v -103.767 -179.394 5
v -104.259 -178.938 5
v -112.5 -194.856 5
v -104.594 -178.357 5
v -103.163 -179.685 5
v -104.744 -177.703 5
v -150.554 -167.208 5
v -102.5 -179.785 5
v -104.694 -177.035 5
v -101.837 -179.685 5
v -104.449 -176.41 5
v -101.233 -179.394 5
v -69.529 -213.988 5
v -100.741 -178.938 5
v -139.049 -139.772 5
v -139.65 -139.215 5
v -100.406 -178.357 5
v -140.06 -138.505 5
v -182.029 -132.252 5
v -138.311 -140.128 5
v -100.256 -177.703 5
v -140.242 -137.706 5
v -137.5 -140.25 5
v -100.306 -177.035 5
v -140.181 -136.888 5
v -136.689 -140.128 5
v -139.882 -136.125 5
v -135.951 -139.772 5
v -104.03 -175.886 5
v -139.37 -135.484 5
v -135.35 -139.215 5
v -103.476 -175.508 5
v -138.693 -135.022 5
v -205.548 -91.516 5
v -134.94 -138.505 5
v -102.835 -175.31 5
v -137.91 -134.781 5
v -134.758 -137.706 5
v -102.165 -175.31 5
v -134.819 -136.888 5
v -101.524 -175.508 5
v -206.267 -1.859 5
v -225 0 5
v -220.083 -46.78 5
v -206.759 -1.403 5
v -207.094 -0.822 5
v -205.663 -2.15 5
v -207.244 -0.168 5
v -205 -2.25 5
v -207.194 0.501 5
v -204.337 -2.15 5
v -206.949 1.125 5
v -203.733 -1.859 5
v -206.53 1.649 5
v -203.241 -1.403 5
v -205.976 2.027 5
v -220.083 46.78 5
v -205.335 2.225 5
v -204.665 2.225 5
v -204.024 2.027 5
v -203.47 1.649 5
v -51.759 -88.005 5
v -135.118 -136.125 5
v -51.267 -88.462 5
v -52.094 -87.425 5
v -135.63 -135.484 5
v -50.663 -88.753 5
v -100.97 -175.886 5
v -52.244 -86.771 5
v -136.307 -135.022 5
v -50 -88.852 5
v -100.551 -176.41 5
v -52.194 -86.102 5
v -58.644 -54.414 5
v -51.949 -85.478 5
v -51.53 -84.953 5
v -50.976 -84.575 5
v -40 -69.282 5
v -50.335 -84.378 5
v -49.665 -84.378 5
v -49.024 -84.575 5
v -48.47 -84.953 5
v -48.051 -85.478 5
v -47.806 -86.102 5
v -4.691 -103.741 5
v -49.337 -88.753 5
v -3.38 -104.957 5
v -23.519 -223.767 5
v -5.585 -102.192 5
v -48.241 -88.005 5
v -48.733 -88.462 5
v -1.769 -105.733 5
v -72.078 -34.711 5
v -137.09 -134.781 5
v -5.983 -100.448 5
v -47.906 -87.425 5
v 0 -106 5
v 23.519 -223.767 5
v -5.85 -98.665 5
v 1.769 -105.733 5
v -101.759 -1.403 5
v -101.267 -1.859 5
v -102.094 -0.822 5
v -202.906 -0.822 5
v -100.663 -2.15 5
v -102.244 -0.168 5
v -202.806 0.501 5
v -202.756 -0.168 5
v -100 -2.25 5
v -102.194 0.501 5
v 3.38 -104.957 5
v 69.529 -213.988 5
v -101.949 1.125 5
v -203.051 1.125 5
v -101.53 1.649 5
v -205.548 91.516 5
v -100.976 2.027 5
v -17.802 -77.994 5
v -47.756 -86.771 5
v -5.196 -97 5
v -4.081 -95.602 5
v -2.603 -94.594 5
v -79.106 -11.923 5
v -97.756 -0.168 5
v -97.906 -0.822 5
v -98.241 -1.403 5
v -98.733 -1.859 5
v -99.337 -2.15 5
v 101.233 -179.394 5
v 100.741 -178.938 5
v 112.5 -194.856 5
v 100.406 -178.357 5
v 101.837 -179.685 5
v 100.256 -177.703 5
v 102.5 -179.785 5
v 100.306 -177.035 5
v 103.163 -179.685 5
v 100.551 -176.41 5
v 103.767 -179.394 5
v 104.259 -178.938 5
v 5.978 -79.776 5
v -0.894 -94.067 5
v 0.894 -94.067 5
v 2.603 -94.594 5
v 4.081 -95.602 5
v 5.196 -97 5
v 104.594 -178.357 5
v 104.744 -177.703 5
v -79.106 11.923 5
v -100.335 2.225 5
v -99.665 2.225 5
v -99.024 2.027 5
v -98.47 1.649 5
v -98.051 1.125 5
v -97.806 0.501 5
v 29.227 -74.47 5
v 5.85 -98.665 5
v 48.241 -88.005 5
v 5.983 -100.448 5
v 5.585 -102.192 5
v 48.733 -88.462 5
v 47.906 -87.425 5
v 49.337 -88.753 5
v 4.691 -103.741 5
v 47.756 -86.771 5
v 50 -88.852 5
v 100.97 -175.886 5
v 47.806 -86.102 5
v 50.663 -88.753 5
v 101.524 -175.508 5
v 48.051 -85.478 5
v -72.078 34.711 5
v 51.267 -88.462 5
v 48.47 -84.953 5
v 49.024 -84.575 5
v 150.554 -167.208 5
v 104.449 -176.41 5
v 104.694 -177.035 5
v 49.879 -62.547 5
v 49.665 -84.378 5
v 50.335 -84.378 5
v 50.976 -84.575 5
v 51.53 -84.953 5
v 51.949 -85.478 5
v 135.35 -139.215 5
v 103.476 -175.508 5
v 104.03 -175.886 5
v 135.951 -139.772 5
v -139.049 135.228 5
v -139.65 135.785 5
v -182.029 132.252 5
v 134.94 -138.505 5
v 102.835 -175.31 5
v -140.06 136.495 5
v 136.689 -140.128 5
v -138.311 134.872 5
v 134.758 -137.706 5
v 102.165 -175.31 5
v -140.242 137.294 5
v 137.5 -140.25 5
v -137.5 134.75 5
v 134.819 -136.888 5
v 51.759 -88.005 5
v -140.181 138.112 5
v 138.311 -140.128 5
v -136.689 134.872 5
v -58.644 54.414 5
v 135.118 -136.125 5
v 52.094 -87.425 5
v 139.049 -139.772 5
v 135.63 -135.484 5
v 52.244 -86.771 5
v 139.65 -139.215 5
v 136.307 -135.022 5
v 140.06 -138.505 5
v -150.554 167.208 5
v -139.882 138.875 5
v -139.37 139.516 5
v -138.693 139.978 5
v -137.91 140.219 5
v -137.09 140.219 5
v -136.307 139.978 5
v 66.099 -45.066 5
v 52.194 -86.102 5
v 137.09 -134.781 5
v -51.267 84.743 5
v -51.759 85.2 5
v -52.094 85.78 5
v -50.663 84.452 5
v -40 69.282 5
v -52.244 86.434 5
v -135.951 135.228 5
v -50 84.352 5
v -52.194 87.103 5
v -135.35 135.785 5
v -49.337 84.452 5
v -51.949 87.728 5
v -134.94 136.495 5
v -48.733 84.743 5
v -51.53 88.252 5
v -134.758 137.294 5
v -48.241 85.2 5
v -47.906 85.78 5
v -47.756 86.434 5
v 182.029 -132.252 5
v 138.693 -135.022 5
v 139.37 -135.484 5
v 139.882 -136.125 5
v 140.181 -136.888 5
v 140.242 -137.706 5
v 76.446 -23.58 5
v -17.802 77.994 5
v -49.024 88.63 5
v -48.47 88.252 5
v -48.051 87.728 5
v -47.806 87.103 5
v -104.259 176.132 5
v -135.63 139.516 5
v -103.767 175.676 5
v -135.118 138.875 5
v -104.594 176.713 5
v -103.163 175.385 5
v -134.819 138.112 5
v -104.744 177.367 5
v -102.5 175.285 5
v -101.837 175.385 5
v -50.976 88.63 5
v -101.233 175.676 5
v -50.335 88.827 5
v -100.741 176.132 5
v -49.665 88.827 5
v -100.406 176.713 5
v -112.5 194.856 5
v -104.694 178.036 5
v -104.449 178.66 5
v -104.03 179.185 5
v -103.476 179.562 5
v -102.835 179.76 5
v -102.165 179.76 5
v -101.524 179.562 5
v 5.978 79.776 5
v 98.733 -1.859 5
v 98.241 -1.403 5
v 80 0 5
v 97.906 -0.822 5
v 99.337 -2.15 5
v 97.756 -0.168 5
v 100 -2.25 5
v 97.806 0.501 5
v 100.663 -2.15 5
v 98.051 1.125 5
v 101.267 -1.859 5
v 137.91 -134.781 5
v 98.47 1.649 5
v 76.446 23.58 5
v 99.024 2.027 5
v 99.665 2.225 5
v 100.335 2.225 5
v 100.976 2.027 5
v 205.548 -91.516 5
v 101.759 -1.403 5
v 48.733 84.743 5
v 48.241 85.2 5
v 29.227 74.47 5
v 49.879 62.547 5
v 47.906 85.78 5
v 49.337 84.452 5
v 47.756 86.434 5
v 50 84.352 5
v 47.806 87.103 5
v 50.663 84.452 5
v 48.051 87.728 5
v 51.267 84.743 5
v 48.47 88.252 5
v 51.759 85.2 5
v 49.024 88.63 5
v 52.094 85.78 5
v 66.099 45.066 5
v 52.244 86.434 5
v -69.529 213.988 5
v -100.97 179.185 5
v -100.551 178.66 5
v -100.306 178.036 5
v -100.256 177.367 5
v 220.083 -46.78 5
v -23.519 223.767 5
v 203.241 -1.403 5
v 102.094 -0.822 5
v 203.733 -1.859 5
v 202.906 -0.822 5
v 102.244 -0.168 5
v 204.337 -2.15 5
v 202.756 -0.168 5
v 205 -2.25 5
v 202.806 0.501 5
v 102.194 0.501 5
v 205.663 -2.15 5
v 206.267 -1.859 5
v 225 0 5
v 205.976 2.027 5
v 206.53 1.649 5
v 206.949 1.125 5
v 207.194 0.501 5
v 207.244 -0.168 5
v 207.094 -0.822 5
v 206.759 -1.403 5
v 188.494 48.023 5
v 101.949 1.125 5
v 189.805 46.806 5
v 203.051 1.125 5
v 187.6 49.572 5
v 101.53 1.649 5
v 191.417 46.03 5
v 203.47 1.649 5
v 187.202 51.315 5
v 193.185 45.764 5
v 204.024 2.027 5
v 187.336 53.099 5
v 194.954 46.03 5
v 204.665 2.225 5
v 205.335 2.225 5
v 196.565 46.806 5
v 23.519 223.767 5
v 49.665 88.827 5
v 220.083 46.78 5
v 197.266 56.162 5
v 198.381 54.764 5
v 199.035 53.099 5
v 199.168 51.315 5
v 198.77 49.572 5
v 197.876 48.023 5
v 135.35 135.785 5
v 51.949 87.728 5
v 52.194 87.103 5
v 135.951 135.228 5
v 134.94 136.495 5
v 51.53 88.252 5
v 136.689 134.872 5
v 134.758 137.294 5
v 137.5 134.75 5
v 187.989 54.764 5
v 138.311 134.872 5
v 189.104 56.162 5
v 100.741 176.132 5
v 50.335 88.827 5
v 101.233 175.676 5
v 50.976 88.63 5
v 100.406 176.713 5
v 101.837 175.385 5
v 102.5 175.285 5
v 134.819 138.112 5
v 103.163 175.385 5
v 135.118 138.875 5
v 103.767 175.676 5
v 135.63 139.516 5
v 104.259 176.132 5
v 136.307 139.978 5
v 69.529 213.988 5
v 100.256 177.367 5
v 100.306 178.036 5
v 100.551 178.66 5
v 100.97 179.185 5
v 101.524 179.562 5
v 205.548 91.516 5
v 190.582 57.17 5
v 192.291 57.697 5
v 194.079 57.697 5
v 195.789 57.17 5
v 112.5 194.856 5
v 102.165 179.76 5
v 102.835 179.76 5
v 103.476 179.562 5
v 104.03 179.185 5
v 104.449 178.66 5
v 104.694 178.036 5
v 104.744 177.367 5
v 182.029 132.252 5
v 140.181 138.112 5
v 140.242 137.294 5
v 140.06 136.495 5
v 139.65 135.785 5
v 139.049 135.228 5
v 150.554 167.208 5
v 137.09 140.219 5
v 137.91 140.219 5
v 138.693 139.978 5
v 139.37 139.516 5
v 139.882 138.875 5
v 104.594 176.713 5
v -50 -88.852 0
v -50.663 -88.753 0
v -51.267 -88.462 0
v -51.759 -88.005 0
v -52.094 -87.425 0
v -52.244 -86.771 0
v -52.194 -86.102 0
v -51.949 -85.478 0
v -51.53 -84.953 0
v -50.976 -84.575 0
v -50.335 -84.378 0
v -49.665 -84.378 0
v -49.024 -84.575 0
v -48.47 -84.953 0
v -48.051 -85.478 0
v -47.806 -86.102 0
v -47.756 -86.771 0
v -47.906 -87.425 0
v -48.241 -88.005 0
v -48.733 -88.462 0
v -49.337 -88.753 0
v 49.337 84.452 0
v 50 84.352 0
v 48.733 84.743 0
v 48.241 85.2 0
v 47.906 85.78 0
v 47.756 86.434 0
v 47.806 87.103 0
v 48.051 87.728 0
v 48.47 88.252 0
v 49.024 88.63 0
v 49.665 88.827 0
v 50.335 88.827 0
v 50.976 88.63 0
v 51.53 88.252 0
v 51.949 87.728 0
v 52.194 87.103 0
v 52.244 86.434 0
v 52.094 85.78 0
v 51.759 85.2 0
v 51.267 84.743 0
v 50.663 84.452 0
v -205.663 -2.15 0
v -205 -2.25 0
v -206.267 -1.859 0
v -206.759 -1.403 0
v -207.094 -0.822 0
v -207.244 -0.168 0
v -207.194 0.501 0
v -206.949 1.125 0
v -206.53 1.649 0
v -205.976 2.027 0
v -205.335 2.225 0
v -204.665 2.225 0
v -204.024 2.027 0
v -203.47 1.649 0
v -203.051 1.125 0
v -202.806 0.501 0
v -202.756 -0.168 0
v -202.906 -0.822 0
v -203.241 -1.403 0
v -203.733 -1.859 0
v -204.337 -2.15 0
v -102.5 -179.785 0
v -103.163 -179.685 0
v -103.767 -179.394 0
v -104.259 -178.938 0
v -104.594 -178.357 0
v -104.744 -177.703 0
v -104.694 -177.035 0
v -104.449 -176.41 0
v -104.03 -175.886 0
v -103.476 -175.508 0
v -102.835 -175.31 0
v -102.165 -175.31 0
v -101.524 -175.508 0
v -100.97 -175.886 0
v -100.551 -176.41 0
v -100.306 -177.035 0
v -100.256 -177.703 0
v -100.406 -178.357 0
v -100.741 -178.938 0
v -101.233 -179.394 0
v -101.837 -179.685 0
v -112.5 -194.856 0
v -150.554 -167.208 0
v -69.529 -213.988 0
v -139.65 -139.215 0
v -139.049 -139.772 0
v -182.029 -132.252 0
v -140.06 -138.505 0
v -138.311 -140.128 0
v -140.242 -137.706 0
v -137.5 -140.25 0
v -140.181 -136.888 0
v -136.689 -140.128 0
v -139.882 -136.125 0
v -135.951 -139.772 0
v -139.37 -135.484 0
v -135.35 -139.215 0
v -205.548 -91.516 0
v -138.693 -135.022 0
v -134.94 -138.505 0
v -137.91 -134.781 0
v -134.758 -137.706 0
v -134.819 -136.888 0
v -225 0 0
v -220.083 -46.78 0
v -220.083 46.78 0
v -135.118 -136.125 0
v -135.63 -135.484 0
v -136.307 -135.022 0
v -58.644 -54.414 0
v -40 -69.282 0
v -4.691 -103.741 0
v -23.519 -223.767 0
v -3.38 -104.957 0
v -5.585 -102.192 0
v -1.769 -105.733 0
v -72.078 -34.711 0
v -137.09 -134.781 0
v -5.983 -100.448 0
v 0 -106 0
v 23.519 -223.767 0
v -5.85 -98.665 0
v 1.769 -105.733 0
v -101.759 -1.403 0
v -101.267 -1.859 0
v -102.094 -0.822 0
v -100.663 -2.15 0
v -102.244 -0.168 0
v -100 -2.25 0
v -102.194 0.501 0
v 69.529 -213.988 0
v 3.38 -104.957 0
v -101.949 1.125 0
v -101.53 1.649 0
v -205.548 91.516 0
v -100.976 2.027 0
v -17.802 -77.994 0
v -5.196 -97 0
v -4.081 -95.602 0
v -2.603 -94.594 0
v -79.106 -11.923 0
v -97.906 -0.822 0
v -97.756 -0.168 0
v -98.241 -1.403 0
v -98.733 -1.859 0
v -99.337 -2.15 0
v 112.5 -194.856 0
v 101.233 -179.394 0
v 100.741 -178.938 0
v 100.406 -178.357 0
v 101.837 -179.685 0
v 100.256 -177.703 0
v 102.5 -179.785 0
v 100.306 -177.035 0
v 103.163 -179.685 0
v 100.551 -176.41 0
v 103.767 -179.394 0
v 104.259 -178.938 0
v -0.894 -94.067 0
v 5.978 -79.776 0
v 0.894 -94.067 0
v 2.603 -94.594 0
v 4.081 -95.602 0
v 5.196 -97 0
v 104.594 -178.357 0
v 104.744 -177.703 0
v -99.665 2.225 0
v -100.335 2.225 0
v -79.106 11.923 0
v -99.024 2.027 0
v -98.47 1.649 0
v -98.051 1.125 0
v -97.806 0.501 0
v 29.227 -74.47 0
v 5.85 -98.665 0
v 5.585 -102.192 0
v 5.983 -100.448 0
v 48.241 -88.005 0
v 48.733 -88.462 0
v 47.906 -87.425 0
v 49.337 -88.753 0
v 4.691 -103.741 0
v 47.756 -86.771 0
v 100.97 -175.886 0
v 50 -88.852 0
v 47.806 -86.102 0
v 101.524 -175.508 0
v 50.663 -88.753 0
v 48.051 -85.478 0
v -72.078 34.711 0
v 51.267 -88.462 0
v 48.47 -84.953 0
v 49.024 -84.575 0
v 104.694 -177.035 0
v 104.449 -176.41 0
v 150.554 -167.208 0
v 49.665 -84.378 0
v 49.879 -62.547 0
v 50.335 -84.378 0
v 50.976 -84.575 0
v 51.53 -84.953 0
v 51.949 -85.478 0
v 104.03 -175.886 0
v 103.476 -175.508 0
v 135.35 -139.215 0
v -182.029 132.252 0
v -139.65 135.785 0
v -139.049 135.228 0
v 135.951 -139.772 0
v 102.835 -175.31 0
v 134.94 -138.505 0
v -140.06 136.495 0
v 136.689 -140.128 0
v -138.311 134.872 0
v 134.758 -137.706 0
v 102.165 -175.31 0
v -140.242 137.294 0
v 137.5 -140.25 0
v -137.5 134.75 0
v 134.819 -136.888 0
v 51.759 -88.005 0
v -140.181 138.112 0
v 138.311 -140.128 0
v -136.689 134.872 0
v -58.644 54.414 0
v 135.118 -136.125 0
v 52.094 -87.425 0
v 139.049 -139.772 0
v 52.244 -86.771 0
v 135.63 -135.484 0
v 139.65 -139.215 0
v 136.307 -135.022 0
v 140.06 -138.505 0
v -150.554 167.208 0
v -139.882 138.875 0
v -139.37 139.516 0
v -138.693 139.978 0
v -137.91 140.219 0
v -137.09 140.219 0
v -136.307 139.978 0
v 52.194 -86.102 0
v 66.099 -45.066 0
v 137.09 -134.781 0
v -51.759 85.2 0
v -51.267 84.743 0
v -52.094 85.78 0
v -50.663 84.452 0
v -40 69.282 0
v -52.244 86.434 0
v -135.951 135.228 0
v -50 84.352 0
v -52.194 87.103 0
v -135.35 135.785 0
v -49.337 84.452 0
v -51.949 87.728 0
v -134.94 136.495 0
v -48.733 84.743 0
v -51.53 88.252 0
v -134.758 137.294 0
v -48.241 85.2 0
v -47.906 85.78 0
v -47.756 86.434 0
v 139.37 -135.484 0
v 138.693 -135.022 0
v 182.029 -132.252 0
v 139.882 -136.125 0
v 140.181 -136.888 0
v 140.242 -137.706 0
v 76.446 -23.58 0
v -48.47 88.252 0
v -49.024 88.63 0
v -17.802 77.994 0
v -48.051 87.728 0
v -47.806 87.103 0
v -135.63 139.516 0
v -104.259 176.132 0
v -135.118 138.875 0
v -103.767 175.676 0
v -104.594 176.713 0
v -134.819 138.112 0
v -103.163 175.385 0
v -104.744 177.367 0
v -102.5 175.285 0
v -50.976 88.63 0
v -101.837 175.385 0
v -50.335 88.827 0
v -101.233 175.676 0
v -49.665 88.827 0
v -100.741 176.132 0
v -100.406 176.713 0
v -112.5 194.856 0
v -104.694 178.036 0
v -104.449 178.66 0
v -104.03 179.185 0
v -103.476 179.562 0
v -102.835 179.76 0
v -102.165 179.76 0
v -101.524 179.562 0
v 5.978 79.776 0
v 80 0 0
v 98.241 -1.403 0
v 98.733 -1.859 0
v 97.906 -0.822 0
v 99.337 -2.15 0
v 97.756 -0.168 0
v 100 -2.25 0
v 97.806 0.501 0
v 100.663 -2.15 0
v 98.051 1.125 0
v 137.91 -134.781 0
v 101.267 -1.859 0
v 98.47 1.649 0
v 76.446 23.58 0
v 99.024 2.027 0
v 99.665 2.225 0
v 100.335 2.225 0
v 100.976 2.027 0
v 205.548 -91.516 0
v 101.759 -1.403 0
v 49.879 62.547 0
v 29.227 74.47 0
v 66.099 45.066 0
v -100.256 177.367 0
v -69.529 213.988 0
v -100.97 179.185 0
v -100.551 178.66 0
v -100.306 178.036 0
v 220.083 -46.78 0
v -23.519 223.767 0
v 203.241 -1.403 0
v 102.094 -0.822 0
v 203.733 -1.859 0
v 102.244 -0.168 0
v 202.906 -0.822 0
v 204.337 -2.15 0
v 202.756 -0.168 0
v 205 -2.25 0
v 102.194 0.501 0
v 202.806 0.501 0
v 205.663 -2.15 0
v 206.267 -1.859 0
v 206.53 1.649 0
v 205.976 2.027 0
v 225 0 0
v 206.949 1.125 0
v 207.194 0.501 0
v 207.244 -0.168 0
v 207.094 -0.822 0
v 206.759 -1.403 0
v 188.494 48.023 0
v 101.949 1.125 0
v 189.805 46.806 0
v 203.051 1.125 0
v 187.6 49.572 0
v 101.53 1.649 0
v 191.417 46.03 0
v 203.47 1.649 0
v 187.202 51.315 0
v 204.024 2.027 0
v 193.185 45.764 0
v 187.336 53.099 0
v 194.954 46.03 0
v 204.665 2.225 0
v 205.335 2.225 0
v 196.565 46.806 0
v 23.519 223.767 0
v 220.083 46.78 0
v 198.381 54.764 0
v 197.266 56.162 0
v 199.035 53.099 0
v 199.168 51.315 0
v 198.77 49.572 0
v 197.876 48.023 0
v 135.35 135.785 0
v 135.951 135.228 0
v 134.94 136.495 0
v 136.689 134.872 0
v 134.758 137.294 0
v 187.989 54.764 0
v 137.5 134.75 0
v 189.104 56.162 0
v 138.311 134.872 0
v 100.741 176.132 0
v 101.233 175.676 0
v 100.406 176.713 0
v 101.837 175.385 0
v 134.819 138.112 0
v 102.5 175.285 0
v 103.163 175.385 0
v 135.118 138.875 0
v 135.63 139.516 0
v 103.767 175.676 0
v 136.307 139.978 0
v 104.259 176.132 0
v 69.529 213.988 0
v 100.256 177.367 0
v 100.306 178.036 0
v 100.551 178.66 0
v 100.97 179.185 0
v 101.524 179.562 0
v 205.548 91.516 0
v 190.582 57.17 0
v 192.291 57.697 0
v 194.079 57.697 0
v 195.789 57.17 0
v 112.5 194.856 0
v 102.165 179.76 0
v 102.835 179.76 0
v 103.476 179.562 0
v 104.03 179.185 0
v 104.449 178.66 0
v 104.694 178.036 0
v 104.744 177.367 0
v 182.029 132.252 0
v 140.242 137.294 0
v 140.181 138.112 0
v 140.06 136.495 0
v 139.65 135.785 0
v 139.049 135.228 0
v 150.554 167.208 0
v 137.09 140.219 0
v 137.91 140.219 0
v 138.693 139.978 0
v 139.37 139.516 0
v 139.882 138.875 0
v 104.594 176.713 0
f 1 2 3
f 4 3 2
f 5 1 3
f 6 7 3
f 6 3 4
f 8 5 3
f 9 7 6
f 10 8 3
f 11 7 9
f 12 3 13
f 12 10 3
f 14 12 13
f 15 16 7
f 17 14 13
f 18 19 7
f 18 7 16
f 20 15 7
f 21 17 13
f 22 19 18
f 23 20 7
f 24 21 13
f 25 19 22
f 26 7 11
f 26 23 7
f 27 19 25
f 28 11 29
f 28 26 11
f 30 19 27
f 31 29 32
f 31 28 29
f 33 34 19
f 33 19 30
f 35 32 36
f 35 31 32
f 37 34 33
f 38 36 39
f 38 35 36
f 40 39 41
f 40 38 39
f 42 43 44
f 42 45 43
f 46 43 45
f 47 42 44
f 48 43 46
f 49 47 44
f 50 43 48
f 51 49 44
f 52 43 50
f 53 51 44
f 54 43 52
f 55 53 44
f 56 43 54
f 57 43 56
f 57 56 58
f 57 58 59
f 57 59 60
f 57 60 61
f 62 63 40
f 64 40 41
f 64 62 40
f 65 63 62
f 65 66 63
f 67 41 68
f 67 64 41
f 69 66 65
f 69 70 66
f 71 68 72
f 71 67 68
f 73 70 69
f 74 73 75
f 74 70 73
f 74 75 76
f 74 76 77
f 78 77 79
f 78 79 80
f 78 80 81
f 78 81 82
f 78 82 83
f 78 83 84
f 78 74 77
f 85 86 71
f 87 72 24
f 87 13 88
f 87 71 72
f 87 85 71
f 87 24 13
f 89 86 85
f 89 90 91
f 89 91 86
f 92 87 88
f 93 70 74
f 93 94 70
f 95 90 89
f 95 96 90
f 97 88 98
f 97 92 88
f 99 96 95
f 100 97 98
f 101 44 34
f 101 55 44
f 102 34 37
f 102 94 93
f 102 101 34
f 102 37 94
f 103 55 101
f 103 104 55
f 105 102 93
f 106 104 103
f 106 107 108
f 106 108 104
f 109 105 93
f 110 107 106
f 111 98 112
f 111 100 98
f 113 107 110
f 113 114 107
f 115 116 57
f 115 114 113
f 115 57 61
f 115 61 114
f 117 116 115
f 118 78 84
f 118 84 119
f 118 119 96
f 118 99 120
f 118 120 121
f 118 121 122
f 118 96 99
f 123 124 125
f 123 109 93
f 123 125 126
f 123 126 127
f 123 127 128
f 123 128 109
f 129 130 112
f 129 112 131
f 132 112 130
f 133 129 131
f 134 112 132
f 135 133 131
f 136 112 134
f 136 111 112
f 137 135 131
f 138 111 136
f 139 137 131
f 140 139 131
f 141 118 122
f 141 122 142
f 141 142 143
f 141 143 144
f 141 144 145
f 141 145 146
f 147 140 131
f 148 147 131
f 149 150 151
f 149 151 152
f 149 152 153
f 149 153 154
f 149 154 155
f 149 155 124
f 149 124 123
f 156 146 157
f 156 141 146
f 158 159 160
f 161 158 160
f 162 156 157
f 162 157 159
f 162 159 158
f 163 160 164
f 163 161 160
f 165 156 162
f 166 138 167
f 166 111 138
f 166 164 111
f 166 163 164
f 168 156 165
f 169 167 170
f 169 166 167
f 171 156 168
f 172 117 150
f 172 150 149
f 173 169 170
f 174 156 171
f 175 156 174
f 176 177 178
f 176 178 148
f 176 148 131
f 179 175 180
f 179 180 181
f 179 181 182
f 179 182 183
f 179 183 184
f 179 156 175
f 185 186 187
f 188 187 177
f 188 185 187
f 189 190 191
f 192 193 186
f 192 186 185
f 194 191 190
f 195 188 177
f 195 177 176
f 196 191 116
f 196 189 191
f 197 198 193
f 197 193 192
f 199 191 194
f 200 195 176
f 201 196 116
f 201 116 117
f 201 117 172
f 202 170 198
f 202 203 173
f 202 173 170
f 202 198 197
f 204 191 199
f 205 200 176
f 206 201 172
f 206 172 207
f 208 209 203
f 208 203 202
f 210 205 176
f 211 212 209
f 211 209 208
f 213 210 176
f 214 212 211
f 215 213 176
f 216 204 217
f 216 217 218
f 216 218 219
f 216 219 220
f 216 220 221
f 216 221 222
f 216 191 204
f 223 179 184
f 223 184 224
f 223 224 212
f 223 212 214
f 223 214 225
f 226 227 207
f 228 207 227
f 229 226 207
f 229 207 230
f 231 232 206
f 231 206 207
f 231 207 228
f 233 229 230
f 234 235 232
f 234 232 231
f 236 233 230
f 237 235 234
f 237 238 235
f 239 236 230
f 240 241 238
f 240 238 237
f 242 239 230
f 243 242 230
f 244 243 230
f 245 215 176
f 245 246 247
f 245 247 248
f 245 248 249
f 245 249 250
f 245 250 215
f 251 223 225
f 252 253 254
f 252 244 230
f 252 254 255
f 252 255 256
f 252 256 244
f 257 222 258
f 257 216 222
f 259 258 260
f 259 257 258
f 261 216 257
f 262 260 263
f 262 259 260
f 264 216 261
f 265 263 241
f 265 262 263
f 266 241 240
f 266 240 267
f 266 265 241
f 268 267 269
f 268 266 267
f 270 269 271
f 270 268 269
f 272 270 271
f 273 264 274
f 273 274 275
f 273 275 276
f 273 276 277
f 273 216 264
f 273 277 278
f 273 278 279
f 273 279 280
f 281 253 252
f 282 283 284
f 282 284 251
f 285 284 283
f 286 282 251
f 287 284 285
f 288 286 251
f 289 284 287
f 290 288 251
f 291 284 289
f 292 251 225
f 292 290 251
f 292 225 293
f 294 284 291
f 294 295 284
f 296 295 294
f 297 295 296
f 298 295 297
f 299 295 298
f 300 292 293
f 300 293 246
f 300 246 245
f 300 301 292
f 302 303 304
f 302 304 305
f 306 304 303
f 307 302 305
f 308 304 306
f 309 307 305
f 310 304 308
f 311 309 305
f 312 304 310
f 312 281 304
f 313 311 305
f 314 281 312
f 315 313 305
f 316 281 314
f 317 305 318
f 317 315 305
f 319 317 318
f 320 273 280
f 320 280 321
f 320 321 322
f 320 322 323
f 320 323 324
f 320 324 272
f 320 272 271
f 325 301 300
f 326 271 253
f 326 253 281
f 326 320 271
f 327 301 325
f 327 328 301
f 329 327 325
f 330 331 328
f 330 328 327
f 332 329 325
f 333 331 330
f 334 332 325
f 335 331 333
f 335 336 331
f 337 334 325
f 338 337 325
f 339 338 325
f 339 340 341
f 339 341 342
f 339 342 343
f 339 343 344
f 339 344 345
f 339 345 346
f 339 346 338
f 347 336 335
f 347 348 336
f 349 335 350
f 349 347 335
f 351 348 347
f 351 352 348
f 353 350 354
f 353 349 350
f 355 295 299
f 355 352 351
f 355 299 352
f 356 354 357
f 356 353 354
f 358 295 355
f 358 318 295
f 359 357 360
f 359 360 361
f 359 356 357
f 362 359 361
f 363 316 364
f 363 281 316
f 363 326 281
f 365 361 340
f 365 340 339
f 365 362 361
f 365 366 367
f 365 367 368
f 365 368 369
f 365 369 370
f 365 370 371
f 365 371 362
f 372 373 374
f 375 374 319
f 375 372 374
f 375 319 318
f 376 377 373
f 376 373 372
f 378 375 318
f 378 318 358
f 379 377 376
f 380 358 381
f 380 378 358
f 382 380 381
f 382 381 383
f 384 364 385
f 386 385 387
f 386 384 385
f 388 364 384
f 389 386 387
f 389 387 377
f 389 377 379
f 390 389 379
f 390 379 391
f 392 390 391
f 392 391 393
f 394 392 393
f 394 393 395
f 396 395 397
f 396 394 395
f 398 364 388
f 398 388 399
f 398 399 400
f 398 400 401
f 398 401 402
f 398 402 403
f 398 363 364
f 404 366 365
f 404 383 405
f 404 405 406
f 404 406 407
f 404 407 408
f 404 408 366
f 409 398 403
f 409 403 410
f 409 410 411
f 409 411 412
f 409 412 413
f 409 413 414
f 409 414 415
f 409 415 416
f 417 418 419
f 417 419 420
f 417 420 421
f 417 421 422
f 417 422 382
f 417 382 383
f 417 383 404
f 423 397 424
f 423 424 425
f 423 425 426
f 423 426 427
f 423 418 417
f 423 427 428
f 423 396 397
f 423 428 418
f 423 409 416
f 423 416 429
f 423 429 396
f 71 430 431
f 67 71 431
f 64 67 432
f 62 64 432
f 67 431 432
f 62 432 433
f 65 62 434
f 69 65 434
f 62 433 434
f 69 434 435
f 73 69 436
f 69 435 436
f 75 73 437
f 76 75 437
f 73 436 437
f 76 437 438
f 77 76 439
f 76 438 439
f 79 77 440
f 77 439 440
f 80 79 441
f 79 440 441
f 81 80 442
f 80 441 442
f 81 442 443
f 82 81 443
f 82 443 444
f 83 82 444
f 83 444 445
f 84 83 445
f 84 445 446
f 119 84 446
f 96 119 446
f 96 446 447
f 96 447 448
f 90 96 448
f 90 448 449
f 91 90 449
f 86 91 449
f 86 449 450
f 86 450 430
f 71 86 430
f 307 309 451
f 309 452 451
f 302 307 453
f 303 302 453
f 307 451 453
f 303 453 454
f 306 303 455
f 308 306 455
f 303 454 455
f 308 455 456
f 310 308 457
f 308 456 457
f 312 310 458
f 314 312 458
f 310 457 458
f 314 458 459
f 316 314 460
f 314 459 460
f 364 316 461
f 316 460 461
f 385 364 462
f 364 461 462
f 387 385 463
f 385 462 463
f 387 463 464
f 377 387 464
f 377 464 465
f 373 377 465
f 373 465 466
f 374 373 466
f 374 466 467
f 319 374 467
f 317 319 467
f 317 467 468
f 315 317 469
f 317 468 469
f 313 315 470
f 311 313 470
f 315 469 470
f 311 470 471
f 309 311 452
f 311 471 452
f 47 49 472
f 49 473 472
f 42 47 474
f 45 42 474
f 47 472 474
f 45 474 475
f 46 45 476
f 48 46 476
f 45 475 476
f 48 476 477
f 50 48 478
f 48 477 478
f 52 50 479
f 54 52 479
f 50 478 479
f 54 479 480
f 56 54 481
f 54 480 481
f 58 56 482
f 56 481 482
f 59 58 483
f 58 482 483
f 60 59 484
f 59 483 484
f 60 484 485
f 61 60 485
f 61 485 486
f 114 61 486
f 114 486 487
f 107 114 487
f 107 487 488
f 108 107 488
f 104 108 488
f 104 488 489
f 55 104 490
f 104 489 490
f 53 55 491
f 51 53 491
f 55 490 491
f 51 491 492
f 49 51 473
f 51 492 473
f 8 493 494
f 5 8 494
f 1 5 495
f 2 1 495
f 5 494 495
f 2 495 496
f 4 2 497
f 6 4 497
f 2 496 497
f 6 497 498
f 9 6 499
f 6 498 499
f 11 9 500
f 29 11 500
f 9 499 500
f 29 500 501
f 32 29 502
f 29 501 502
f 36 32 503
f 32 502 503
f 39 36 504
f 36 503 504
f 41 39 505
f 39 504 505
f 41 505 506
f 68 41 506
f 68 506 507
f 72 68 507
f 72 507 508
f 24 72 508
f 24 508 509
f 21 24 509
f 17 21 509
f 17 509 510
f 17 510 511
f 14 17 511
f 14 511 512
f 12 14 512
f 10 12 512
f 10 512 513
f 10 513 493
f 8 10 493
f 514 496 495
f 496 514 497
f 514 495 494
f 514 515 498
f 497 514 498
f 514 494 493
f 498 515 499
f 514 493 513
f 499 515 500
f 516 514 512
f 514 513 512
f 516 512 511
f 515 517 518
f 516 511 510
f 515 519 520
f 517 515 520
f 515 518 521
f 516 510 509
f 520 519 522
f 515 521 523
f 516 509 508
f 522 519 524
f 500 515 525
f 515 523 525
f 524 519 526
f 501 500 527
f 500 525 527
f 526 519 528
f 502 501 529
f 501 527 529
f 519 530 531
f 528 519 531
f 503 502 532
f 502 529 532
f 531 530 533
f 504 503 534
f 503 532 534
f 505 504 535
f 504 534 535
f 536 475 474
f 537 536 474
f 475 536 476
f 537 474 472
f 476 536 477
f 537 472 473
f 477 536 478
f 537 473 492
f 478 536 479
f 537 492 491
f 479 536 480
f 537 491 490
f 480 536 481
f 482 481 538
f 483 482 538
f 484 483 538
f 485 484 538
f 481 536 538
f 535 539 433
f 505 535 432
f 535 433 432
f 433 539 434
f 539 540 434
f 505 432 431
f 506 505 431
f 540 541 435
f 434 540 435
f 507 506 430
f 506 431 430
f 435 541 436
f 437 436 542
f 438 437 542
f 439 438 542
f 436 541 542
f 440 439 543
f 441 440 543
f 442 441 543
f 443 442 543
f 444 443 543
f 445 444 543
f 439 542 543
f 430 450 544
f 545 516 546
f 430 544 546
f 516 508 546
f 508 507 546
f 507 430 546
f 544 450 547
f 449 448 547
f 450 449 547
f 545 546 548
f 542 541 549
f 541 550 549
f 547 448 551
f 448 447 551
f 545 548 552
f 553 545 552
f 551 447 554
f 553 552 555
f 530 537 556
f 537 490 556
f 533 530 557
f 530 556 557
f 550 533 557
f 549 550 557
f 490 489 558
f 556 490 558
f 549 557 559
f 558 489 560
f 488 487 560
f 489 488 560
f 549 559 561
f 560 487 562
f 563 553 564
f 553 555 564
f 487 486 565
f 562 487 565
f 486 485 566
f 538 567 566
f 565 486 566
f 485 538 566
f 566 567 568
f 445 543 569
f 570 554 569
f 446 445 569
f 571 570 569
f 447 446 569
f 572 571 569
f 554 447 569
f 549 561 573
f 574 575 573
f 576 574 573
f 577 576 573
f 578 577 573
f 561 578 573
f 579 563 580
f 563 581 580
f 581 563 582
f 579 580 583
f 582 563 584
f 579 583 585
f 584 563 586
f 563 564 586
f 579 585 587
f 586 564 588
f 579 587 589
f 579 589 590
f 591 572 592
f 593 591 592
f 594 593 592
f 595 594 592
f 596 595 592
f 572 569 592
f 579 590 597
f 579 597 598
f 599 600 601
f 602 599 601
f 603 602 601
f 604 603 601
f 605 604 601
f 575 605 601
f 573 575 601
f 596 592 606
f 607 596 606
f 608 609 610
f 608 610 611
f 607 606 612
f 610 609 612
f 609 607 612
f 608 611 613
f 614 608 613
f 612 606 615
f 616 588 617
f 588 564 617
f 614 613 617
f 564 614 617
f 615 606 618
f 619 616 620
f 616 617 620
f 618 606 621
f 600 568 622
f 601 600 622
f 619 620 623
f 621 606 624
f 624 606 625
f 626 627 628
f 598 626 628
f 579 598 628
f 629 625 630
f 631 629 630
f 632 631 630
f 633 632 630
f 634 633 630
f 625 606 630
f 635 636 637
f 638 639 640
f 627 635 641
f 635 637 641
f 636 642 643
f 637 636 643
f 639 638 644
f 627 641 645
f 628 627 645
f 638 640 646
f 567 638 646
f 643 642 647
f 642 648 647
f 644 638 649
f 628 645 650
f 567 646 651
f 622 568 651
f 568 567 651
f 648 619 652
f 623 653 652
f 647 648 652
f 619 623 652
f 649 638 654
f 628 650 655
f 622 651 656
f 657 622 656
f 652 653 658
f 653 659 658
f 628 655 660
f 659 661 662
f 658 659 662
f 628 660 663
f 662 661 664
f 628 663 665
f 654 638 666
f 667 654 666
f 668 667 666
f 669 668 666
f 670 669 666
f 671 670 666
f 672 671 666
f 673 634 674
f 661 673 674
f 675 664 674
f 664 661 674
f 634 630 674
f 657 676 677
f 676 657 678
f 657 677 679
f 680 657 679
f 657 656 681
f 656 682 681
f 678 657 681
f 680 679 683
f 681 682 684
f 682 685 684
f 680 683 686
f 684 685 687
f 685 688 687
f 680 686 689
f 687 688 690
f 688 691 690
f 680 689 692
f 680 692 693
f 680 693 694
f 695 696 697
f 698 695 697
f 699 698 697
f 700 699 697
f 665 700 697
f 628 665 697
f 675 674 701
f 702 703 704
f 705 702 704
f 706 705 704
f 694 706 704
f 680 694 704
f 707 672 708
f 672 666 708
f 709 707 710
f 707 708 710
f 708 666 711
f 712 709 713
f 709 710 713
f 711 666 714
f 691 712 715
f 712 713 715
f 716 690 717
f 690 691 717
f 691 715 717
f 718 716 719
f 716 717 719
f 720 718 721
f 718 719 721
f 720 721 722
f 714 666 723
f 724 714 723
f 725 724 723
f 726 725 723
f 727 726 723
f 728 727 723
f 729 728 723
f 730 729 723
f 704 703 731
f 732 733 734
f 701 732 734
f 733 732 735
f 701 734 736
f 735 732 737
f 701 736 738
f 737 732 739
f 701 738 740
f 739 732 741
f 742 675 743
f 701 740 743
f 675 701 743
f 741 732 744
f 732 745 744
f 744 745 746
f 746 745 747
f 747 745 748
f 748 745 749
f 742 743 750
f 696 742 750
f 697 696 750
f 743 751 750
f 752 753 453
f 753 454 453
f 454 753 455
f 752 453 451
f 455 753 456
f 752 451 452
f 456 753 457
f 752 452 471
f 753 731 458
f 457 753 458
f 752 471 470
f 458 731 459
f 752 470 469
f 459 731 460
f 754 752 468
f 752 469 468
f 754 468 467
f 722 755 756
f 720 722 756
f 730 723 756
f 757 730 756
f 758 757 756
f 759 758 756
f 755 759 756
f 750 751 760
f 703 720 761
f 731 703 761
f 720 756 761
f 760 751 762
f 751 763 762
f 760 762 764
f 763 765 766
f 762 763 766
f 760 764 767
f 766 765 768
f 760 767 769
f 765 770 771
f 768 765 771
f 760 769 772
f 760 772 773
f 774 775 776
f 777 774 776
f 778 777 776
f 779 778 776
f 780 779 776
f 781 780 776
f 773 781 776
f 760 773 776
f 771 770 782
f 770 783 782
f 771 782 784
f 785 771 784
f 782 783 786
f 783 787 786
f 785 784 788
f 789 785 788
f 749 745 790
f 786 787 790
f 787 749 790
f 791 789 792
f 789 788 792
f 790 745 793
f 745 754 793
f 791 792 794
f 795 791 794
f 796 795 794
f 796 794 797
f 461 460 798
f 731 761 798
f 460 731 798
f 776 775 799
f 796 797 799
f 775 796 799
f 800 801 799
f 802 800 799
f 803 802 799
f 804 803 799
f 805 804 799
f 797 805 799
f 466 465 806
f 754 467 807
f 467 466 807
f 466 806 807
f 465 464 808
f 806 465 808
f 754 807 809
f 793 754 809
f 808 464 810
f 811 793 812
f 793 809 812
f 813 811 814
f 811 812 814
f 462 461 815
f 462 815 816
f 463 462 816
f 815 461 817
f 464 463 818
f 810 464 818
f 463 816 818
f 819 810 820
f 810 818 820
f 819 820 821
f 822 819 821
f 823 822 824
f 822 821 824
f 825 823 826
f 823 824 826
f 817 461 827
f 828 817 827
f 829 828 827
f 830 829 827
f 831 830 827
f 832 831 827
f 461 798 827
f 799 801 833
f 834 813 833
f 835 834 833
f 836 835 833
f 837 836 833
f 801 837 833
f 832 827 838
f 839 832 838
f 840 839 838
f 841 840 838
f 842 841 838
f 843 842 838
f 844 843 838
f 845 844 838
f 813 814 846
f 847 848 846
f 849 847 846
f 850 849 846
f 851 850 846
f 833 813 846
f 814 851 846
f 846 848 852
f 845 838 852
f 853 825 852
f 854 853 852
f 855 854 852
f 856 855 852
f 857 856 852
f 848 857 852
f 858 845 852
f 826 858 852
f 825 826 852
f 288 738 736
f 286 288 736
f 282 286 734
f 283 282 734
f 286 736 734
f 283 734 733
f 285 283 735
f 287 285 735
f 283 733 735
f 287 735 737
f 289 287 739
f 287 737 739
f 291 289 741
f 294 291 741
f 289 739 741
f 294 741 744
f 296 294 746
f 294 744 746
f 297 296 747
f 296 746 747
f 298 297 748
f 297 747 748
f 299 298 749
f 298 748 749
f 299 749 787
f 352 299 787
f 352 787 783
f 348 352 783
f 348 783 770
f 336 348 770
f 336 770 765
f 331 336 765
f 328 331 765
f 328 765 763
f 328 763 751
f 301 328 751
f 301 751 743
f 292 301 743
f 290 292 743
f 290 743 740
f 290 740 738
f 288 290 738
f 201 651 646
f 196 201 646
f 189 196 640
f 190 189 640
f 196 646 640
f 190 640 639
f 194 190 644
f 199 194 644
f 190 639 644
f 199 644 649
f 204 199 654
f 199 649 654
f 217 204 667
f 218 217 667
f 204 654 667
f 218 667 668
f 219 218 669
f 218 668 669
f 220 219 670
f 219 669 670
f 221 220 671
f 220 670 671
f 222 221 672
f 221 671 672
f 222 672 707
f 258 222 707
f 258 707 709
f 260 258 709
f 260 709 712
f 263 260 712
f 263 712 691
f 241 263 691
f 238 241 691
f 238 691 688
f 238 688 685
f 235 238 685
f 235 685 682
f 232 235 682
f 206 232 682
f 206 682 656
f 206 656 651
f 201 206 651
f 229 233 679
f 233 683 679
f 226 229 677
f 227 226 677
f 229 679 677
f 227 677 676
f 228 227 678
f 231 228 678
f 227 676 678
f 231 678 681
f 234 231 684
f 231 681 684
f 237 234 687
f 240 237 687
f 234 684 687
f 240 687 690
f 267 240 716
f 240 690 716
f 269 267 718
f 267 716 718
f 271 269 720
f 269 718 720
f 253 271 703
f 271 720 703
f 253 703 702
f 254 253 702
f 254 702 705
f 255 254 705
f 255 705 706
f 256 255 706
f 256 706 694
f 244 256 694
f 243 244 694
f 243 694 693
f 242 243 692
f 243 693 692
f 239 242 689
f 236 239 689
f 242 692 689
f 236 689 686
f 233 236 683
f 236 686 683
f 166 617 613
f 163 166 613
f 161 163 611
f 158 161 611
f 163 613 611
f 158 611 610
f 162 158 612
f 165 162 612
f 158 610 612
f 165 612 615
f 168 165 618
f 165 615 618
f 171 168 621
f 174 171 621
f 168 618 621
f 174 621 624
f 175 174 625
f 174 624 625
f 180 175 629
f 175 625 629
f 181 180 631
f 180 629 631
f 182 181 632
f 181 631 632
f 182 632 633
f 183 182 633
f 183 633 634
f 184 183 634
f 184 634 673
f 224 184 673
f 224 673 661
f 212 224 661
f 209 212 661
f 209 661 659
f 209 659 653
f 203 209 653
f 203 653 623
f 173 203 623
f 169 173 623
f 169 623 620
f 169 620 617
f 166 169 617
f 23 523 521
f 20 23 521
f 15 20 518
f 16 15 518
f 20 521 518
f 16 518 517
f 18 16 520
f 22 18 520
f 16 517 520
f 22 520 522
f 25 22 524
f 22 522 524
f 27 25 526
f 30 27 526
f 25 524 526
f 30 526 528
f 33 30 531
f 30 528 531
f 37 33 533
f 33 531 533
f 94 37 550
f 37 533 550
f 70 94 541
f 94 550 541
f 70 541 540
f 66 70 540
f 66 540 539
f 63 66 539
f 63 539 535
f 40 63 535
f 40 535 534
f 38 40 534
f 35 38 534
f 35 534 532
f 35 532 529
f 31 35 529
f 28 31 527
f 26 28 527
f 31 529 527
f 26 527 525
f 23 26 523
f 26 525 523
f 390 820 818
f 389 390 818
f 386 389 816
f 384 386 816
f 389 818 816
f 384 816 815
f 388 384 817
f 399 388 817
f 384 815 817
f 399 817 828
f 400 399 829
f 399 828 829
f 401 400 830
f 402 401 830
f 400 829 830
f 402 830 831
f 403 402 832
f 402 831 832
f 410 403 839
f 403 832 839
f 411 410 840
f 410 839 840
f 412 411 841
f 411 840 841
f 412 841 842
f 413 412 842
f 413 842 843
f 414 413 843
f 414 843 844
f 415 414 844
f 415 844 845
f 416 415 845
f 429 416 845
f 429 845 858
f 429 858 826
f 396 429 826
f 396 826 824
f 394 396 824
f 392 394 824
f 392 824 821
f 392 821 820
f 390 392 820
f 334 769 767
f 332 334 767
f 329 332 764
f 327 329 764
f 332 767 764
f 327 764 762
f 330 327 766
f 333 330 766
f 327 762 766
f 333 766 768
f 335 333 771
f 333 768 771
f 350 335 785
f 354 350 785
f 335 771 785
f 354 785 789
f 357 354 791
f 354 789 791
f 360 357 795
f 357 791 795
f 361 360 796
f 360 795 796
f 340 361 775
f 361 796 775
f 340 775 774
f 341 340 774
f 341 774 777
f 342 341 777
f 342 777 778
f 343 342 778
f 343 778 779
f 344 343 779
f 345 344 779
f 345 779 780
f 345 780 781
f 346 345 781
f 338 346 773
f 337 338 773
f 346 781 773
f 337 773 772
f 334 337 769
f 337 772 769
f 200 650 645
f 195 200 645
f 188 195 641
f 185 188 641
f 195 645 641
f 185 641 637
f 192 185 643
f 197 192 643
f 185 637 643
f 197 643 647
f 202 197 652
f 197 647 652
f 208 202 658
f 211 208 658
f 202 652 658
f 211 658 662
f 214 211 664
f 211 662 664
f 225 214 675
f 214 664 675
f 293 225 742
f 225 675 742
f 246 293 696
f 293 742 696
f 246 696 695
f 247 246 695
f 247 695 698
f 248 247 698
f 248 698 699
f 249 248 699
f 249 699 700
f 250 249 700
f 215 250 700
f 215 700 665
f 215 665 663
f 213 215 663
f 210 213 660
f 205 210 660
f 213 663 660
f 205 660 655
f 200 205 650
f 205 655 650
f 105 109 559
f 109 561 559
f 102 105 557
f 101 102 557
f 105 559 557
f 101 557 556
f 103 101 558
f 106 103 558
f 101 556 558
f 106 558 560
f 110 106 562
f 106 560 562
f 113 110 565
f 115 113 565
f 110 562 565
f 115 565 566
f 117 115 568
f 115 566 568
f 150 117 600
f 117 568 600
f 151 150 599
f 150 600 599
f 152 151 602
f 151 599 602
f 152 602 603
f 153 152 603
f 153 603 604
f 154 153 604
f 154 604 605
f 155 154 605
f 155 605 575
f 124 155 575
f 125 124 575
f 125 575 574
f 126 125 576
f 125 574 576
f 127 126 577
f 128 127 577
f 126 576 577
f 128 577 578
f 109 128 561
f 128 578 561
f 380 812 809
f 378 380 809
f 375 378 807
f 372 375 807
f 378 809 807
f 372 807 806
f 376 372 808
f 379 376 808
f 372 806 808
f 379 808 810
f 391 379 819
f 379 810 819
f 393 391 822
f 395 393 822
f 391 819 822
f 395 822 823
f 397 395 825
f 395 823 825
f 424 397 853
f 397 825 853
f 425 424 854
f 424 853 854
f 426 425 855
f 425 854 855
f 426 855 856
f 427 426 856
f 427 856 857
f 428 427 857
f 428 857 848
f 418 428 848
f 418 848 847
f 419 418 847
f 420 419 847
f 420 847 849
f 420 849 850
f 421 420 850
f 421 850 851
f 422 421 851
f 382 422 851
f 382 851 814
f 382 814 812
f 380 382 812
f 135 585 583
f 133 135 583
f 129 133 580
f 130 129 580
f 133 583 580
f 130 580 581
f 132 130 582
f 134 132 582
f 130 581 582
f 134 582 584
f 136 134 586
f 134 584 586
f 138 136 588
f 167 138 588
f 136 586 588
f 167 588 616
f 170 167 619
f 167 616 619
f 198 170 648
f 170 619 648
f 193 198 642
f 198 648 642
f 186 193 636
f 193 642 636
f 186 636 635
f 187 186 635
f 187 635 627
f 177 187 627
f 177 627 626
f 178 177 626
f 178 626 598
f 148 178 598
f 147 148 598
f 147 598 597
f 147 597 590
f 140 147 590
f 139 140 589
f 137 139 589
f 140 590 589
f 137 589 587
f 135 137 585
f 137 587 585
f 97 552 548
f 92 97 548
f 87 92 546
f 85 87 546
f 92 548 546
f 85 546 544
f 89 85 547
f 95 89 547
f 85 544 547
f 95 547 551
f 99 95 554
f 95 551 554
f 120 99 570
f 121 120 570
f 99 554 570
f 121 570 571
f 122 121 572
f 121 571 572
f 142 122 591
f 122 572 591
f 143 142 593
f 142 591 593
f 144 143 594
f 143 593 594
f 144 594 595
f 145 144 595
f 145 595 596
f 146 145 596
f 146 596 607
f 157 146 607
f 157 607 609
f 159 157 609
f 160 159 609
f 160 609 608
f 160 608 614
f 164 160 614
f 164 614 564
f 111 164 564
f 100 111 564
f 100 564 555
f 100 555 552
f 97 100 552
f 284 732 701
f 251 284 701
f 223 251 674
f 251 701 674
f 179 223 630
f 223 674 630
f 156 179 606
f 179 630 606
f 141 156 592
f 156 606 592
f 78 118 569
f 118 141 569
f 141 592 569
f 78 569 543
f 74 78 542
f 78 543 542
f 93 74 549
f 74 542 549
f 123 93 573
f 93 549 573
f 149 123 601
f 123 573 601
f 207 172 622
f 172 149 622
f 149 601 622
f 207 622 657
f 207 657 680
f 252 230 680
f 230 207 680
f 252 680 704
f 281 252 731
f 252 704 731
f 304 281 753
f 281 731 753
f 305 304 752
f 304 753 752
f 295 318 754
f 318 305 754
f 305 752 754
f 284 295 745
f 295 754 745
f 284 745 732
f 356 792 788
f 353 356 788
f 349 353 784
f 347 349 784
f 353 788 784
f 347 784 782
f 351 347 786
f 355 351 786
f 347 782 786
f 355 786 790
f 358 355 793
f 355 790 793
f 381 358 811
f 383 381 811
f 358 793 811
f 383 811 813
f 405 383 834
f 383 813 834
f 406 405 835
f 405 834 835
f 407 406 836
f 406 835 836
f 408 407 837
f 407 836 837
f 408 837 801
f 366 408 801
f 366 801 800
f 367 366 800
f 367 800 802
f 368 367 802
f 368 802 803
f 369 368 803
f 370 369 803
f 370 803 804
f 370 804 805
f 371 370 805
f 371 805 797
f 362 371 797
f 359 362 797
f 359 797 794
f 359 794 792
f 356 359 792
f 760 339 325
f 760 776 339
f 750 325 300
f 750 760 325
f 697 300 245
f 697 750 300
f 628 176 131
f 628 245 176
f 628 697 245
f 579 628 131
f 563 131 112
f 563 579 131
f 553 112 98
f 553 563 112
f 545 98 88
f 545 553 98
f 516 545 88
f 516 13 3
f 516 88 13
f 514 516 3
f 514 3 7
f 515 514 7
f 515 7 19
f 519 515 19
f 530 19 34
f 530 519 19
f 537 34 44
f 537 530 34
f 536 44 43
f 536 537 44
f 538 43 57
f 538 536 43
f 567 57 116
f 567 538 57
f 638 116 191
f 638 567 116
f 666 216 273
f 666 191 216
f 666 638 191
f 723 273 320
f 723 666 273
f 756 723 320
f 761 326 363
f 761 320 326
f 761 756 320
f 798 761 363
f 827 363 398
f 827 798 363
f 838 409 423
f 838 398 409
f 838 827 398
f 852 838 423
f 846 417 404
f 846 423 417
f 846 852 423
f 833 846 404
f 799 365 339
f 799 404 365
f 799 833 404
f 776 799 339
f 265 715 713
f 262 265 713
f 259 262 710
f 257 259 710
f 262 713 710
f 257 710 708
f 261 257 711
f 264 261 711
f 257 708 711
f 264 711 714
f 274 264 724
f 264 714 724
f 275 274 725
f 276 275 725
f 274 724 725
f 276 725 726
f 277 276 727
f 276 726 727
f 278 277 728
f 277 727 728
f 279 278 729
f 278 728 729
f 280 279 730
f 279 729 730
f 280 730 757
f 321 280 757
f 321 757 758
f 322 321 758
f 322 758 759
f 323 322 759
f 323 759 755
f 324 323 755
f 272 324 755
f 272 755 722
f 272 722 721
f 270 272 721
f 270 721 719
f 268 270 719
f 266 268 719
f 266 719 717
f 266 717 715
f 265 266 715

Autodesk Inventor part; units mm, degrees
ref_plane "YZ Plane" through (0, 0, 0) normal (1, 0, 0) x (0, 1, 0)
ref_plane "XZ Plane" through (0, 0, 0) normal (0, 1, 0) x (-1, 0, 0)
ref_plane "XY Plane" through (0, 0, 0) normal (0, 0, 1) x (1, 0, 0)
sketch "Sketch1" plane through (0, 0, 0) normal (0, 0, 1) x (1, 0, 0)
  circle A0 centre (0, 0) radius 80
  circle A1 centre (0, 0) radius 225
  dimension "d0" = 160
  dimension "d1" = 450
extrude "Extrusion1" add sketch "Sketch1" along normal blind 5
sketch "Sketch2" plane through (0, 0, 5) normal (0, 0, 1) x (1, 0, 0)
  line L0 (-205, 0) -> (-100, 0) construction
  point P0 (0, 0)
  point P1 (-102.5, -177.5352)
  point P2 (-50, -86.6025)
  point P3 (102.5, -177.5352)
  point P4 (50, -86.6025)
  point P5 (205, 0)
  point P6 (100, 0)
  point P7 (102.5, 177.5352)
  point P8 (50, 86.6025)
  point P9 (-102.5, 177.5352)
  point P10 (-50, 86.6025)
  dimension "d4" = 100
  dimension "d5" = 205
  dimension "d8" = 360
hole "Hole1" at (-205, 0, 5) at (-100, 0, 5) at (-102.5, -177.5352, 5) at (-50, -86.6025, 5) at (102.5, -177.5352, 5) at (50, -86.6025, 5) at (205, 0, 5) at (100, 0, 5) at (102.5, 177.5352, 5) at (50, 86.6025, 5) at (-102.5, 177.5352, 5) at (-50, 86.6025, 5) direction (0, 0, -1) diameter 4.5 depth 8 tip angle 118 clearance for "Countersunk Flat Head Screw DIN EN ISO 2009" size "M4" standard "DIN"
sketch "Sketch3" plane through (0, 0, 5) normal (0, 0, 1) x (1, 0, 0)
  line L0 (-137.5, -137.5) -> (137.5, -137.5) construction
  line L1 (137.5, -137.5) -> (137.5, 137.5) construction
  line L2 (137.5, 137.5) -> (-137.5, 137.5) construction
  line L3 (-137.5, 137.5) -> (-137.5, -137.5) construction
  line L4 (-137.5, -137.5) -> (137.5, 137.5) construction
  line L5 (137.5, -137.5) -> (-137.5, 137.5) construction
  point P0 (0, 0)
  dimension "d17" = 275
  dimension "d18" = 275
hole "Hole2" at (-137.5, 137.5, 5) at (137.5, -137.5, 5) at (-137.5, -137.5, 5) at (137.5, 137.5, 5) direction (0, 0, -1) diameter 5.5 depth 8 tip angle 118 clearance for "Countersunk Flat Head Screw DIN EN ISO 2009" size "M5" standard "DIN"
sketch "Sketch4" plane through (0, 0, 5) normal (0, 0, 1) x (1, 0, 0)
  line L0 (0, 0) -> (193.1852, 51.7638) construction
  line L1 (0, 0) -> (-138.753, 0) construction
  point P0 (0, -100)
  dimension "d26" = 100
  dimension "d38" = 200
  dimension "d39" = 165
hole "Hole3" at (0, -100, 5) at (193.1852, 51.7638, 5) direction (0, 0, -1) diameter 12 depth 8 tip angle 118
properties part number "Primary" material "Polycarbonate, Clear"
